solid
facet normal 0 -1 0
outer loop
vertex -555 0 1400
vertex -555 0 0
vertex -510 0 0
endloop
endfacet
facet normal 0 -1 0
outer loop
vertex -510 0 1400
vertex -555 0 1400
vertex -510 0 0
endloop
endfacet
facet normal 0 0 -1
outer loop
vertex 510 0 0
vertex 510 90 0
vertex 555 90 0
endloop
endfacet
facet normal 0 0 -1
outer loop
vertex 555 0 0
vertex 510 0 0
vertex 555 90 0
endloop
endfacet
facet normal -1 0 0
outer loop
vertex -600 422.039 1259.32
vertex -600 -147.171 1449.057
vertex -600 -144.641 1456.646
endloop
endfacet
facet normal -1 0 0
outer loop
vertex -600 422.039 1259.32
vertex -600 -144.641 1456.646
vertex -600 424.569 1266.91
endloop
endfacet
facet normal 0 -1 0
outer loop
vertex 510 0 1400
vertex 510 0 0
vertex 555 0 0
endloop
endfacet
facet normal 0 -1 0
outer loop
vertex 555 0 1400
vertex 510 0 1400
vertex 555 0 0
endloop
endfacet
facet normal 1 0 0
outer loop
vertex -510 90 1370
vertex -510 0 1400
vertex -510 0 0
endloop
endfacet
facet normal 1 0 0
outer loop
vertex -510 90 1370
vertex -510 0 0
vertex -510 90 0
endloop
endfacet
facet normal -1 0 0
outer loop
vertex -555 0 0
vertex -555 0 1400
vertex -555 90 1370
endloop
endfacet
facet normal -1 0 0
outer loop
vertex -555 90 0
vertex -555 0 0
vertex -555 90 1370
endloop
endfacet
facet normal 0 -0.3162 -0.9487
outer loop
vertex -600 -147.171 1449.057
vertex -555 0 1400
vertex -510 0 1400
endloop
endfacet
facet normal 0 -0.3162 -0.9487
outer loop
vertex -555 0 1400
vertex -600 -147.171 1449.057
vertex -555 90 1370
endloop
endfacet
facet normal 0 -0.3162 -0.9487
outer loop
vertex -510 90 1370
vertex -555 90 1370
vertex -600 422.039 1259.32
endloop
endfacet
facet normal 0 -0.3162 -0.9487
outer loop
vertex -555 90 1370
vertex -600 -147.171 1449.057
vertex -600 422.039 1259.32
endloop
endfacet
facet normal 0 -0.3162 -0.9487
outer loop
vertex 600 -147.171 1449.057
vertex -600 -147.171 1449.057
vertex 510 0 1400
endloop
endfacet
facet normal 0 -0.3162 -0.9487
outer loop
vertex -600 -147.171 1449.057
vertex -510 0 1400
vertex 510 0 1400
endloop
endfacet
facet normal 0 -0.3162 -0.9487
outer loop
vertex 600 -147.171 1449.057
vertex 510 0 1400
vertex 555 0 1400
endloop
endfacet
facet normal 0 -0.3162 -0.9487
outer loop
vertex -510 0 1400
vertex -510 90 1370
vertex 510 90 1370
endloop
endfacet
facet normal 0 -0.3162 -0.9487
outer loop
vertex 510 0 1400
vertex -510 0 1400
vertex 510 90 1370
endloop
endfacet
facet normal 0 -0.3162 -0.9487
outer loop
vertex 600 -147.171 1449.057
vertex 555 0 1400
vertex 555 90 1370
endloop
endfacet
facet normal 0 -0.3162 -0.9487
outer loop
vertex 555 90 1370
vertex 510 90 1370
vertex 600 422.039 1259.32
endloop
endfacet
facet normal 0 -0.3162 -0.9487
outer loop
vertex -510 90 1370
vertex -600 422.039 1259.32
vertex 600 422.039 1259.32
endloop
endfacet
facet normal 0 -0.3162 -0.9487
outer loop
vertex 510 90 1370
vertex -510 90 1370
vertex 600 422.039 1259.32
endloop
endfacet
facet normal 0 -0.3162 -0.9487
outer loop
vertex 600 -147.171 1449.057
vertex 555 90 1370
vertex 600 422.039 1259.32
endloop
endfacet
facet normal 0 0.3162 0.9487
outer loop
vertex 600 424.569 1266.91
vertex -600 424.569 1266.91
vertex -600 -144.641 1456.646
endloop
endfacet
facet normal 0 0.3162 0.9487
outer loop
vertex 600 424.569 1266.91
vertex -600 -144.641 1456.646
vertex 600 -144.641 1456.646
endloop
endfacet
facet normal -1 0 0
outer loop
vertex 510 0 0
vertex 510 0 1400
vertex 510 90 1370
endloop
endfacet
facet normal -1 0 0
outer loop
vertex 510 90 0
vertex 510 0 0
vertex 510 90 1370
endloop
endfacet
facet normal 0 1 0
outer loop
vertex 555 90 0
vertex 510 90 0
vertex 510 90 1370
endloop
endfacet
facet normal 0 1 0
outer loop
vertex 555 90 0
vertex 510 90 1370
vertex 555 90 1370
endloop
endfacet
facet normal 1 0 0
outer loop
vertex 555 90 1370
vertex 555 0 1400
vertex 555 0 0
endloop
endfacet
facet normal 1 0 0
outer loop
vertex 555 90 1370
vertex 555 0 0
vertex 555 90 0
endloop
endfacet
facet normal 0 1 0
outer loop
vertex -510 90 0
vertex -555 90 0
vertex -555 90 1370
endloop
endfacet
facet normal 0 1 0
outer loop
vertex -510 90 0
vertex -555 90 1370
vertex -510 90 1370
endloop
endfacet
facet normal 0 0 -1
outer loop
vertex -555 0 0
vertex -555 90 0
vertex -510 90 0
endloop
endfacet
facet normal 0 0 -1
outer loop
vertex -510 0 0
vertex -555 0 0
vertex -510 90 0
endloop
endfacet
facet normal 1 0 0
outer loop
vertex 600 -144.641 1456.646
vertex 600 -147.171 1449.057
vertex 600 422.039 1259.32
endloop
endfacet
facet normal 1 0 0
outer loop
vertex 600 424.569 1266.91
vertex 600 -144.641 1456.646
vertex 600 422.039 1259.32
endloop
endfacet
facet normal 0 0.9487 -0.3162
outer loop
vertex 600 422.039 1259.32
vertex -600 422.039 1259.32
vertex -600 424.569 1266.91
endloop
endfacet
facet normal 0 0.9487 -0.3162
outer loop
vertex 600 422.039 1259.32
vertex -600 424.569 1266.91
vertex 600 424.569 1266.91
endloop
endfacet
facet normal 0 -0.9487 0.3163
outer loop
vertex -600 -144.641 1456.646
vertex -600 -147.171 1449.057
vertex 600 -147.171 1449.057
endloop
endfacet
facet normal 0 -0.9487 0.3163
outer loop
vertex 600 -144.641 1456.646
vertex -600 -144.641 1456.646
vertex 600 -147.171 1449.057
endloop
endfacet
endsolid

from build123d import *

# Parameters (mm, degrees)
F0_W     = 45
F0_H     = 90
F1_DEPTH = 1400
F3_DEPTH = 1110.001
F5_DEPTH = 45.001
F6_W     = 1200
F6_H     = 600
F7_DEPTH = 8


with BuildPart() as f1:
    # F0 (on Top) → F1 (new body)
    with BuildSketch(Plane.XY):
        with Locations((-532.5, 45)):
            Rectangle(F0_W, F0_H)
    extrude(amount=F1_DEPTH)


with BuildPart() as f1b:
    # F0 (on Top) → F1, piece 2 (new body)
    with BuildSketch(Plane.XY):
        with Locations((532.5, 45)):
            Rectangle(F0_W, F0_H)
    extrude(amount=F1_DEPTH)


with BuildPart() as f3_tool:
    # F2 (on face) → F3 (new body, through all)
    with BuildSketch(Plane(origin=(-555, 0, 0), x_dir=(0, -1, 0), z_dir=(-1, 0, 0))):
        Polygon((0, 1400), (-90, 1400), (-90, 1370), align=None)
    extrude(amount=-F3_DEPTH)


with BuildPart() as f1_1:
    add(f1.part)

    # F3: cut by f3_tool
    add(f3_tool.part, mode=Mode.SUBTRACT)

    # F4 (on face) → F5 (cut, through all)
    with BuildSketch(Plane(origin=(510, 0, 0), x_dir=(0, -1, 0), z_dir=(-1, 0, 0))):
        Polygon((0, 1400), (-90, 1400), (-90, 1370), align=None)
    extrude(amount=-F5_DEPTH, mode=Mode.SUBTRACT)



with BuildPart() as f1b_1:
    add(f1b.part)

    # F3: cut by f3_tool
    add(f3_tool.part, mode=Mode.SUBTRACT)


with BuildPart() as f1_2:
    add(f1_1.part)

    add(f1b_1.part)  # F7 merges F1b
    # F6 (on face) → F7 (join)
    with BuildSketch(Plane(origin=(0, 420, 1260), x_dir=(1, 0, 0), z_dir=(0, 0.316227766, 0.9486832981))):
        with Locations((0, -297.8505426185)):
            Rectangle(F6_W, F6_H)
    extrude(amount=F7_DEPTH)


solid = f1_2.part
